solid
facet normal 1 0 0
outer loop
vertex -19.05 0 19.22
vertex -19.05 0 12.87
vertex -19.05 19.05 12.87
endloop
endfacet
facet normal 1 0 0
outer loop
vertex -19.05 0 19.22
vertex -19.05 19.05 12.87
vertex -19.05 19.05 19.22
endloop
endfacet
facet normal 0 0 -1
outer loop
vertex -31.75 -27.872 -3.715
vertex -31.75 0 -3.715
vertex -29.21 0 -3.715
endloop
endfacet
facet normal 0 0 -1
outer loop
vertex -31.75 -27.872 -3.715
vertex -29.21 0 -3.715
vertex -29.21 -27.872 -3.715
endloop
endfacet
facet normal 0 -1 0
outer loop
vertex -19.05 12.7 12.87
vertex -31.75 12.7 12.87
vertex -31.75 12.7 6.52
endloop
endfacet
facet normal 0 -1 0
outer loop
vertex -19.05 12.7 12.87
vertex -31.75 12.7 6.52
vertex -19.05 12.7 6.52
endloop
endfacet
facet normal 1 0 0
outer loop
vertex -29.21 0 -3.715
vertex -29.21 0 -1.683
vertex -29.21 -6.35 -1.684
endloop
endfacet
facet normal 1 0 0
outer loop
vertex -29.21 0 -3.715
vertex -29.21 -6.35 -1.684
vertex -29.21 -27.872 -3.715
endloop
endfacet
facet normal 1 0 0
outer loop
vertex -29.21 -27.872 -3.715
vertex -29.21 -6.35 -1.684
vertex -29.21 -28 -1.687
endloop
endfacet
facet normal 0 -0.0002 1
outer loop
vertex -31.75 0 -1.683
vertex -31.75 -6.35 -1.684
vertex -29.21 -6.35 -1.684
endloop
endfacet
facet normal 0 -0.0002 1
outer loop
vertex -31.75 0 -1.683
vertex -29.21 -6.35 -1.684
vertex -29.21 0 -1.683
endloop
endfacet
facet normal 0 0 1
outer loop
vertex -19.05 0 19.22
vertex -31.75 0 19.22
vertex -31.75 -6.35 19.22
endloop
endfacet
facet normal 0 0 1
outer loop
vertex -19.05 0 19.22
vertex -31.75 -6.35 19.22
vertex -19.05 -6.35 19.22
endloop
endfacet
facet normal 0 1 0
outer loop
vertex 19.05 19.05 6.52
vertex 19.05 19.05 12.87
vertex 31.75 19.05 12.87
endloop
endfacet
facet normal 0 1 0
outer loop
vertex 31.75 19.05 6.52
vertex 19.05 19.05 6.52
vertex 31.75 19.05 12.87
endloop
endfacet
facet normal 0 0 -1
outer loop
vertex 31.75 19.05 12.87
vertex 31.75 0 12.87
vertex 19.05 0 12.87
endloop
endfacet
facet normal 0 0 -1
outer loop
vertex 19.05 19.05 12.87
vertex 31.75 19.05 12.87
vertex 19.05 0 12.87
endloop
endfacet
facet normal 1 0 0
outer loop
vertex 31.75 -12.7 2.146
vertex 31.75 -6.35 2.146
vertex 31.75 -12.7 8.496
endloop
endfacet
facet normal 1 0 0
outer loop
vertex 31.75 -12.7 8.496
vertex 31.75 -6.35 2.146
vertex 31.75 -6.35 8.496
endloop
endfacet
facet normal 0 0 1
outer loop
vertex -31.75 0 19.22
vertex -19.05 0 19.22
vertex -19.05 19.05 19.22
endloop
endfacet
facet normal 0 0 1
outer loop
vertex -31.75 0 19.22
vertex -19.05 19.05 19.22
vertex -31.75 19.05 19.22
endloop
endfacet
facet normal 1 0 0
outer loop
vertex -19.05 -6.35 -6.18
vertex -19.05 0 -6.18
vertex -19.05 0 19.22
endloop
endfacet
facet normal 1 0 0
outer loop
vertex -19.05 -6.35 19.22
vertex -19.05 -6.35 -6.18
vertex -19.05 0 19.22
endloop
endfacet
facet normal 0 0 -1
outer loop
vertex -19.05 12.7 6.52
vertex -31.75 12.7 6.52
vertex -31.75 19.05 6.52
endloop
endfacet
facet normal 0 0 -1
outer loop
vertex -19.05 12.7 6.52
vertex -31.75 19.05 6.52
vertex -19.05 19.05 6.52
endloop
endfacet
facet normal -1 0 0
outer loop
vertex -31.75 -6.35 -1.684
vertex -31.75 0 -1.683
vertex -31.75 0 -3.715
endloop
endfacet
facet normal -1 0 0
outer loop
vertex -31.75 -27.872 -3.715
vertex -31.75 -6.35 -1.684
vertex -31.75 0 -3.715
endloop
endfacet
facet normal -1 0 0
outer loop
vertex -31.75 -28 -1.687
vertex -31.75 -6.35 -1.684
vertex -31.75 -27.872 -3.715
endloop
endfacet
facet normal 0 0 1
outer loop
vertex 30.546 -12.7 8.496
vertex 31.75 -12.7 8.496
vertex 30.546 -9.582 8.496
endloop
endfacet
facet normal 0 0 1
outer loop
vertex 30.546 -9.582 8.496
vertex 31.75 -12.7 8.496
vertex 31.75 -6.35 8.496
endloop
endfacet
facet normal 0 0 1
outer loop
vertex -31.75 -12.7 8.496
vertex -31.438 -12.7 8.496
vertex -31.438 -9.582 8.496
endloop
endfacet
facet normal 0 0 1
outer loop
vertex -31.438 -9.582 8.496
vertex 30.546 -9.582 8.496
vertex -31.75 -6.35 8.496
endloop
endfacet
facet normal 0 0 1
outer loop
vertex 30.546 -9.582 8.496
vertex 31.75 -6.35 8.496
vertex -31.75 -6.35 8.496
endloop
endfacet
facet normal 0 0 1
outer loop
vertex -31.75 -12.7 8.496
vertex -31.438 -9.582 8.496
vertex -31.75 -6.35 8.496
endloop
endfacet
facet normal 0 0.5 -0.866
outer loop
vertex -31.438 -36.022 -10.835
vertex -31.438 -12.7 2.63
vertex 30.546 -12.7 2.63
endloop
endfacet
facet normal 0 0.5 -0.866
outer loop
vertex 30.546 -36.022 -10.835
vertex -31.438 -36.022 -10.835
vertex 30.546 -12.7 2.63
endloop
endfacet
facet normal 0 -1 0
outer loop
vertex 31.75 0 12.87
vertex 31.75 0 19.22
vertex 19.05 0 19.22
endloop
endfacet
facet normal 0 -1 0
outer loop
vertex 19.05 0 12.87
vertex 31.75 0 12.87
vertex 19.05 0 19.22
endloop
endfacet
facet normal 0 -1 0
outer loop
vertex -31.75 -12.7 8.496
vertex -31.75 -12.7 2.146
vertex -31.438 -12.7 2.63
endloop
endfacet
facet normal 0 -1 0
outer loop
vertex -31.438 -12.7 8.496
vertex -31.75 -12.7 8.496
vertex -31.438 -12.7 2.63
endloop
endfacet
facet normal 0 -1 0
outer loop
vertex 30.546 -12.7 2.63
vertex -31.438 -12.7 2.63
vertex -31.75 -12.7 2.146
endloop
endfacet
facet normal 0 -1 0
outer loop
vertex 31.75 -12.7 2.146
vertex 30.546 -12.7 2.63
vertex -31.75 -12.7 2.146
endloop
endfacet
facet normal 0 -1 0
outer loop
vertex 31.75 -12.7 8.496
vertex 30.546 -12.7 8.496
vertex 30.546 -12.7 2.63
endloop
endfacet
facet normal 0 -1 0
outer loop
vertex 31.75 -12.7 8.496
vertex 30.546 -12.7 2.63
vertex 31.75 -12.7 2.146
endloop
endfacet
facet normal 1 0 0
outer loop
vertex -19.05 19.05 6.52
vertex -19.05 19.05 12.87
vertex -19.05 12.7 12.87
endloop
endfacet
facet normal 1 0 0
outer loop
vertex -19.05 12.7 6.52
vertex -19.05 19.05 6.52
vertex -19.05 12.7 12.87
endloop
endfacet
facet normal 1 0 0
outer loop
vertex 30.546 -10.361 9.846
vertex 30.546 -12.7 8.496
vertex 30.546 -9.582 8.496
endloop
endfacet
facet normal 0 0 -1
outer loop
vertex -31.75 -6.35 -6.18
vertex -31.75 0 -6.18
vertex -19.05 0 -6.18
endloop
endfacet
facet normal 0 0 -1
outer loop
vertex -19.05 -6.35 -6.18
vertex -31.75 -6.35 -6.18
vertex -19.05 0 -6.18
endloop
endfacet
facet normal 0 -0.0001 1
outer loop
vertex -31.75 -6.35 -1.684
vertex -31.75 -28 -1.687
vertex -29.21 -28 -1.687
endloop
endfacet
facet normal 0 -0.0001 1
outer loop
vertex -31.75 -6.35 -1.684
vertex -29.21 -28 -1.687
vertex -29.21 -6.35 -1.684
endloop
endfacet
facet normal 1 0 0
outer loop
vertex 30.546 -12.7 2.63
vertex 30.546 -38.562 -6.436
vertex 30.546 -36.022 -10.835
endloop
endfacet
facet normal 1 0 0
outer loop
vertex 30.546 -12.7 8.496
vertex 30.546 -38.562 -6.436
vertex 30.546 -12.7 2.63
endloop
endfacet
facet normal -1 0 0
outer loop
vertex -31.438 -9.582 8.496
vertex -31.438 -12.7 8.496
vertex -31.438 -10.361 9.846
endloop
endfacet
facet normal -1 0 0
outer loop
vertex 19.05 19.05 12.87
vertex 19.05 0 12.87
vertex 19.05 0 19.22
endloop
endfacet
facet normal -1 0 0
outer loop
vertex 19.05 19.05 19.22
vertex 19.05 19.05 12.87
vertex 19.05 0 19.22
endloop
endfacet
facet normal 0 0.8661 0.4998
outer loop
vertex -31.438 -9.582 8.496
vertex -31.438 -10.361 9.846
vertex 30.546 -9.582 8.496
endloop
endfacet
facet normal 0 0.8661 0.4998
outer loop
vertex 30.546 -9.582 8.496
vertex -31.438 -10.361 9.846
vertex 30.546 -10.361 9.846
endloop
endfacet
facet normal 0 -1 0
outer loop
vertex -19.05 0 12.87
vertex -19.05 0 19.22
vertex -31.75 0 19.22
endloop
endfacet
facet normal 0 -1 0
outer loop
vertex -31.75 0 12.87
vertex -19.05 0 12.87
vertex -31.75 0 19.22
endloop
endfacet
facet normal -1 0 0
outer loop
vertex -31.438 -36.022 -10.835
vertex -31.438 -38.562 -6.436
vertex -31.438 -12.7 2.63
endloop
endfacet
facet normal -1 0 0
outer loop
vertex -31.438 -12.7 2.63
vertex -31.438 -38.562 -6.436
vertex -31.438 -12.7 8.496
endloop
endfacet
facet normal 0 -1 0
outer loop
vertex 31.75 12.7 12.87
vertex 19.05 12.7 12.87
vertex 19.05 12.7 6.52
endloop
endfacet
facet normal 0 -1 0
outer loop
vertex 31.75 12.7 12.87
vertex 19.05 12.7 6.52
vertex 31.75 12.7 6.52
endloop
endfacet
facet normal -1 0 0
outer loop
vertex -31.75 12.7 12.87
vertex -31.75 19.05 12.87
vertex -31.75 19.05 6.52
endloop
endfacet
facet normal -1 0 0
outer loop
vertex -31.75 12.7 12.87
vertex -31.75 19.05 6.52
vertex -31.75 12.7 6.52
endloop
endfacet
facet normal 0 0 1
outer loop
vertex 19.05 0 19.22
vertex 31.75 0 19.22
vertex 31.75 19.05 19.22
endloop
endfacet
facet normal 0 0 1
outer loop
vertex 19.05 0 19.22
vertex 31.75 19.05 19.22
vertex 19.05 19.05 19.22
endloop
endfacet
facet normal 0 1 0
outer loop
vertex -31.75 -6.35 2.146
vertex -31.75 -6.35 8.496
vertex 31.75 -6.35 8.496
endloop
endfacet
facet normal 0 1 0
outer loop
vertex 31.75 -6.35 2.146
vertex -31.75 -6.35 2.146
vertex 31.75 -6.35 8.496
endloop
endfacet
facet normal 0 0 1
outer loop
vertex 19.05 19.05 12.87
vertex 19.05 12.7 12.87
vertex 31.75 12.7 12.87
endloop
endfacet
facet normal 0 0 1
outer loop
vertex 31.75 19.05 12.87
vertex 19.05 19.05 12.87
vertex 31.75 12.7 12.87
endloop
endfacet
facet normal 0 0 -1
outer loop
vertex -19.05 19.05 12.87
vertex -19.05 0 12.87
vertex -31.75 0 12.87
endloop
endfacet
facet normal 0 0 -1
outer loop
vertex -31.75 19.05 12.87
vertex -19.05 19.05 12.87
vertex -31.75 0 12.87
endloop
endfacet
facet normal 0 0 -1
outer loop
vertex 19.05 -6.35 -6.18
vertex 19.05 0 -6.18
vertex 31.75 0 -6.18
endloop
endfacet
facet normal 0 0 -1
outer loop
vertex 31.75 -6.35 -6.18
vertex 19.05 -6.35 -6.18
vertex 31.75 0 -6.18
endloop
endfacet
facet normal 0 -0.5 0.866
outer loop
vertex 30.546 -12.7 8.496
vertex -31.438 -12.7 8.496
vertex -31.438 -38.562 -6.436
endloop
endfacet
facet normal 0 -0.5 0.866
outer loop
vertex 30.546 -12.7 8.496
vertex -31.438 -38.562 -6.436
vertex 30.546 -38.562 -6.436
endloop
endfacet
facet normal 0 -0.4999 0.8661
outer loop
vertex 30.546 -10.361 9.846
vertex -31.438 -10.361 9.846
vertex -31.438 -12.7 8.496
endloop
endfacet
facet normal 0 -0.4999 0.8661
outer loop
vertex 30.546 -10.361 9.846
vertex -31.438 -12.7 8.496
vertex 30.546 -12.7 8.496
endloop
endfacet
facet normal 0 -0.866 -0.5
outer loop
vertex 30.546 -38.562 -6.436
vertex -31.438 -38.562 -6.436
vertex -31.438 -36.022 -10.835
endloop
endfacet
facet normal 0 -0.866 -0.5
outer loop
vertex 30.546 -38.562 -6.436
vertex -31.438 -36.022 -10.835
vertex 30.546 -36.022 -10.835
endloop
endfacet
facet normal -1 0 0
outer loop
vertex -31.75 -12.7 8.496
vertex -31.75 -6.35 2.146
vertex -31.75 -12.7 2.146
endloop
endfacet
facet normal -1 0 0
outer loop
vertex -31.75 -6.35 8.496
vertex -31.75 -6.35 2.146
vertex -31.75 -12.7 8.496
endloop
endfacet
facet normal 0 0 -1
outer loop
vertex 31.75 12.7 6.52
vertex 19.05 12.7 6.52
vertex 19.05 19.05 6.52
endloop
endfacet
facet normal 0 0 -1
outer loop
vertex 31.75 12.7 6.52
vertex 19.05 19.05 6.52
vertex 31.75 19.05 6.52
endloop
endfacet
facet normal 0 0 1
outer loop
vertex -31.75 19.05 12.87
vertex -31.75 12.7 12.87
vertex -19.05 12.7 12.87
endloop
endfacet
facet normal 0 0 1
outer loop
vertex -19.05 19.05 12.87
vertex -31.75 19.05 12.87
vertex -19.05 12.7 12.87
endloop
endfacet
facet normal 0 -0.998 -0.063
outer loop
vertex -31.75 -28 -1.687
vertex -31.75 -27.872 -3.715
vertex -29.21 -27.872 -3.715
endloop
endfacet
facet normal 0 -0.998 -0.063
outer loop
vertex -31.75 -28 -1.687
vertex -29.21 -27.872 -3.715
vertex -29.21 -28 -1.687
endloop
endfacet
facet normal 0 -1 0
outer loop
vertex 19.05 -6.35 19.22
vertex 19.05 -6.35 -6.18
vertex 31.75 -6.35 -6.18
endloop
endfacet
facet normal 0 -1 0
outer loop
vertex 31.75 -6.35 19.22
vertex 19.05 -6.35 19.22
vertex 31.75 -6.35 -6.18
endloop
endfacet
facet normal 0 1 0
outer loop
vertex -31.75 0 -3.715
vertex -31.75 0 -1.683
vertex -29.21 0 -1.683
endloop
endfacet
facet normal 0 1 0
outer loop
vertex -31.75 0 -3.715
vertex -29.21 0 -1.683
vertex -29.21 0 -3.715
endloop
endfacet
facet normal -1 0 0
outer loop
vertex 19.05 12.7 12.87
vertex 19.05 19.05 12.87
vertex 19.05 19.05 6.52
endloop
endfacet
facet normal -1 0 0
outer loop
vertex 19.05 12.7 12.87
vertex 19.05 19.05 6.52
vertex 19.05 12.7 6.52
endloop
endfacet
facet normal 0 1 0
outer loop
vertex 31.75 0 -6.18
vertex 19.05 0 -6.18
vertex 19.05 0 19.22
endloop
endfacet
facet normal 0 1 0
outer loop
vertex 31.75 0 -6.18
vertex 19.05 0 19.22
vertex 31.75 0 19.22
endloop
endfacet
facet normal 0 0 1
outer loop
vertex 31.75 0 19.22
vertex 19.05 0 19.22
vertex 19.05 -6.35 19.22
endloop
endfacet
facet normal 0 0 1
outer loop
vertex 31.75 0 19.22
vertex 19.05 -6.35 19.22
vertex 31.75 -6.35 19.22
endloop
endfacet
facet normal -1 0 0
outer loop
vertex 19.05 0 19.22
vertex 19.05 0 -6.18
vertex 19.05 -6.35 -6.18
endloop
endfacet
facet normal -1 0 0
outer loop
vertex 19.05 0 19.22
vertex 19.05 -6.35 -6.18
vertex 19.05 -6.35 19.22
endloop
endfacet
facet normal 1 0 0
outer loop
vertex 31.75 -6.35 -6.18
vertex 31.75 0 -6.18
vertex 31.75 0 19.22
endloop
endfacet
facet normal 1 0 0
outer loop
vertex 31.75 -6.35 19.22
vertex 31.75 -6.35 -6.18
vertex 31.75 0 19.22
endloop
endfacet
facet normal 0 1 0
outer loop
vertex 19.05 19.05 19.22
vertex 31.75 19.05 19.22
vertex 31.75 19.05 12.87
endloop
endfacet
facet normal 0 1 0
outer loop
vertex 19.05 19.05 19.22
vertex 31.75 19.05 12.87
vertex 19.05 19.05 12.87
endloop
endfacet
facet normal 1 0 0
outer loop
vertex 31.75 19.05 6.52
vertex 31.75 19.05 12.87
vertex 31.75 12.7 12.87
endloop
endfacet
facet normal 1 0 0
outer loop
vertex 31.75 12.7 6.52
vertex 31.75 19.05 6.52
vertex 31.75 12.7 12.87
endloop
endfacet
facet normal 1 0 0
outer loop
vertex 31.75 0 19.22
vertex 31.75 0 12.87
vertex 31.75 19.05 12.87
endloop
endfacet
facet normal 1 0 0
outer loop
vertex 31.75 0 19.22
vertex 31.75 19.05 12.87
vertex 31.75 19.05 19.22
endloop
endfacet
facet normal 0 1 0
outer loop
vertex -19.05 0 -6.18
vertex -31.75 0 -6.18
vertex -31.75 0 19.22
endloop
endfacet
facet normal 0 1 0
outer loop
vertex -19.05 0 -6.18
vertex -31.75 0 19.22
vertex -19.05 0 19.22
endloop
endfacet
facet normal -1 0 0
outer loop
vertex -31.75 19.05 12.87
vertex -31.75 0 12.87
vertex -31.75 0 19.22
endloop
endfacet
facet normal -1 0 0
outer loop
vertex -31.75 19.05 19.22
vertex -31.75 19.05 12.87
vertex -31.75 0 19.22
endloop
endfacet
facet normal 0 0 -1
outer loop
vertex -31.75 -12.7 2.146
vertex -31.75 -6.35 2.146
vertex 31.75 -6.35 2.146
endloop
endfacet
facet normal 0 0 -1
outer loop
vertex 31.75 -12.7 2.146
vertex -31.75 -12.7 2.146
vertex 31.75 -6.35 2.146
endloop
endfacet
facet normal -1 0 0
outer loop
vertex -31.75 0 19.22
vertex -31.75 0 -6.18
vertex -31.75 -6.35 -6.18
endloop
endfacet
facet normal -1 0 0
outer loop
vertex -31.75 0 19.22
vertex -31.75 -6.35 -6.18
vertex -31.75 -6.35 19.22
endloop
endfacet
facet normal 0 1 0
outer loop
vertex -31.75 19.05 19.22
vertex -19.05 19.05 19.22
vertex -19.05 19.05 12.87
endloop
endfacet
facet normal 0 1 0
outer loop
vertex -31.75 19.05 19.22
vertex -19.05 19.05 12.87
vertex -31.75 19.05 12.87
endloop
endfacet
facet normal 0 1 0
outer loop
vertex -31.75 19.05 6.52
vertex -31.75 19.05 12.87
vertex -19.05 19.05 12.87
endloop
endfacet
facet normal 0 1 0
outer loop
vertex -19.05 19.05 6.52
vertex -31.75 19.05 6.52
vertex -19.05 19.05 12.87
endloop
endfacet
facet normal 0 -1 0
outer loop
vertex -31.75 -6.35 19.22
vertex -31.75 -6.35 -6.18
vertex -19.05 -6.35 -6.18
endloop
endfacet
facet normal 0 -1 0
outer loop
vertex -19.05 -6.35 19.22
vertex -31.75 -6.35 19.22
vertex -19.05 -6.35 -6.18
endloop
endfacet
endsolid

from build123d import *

# Parameters (mm, degrees)
F0_W      = 12.7
F0_H      = 25.4
F1_DEPTH  = 6.35
F2_W      = 12.7
F2_H      = 6.35
F4_DEPTH  = 19.05
F3_W      = 12.7
F3_H      = 6.35
F5_W      = 12.7
F5_H      = 6.35
F7_DEPTH  = 6.35
F6_W      = 12.7
F6_H      = 6.35
F8_W      = 50.8
F8_H      = 6.35
F8_W_2    = 12.7
F9_DEPTH  = 6.35
F11_W     = 61.9835611433
F11_H     = 32.5631750748
F12_DEPTH = 5.08
F14_DEPTH = 2.54
F15_R     = 0.635
F16_DEPTH = 2.54


with BuildPart() as f1:
    # F0 (on Front) → F1 (new body)
    with BuildSketch(Plane.XZ):
        with Locations((-25.4, 6.5199454318)):
            Rectangle(F0_W, F0_H)
    extrude(amount=F1_DEPTH)

    # F15 (on face) → F16 (cut)
    with BuildSketch(Plane(origin=(-31.75, 0, 0), x_dir=(0, -1, 0), z_dir=(-1, 0, 0))):
        with Locations((1.8122547523, -2.6470723096)):
            Circle(F15_R)
        with Locations((26.4526117745, -2.6470723096)):
            Circle(F15_R)
    extrude(amount=F16_DEPTH, mode=Mode.SUBTRACT)


with BuildPart() as f1b:
    # F0 (on Front) → F1, piece 2 (new body)
    with BuildSketch(Plane.XZ):
        with Locations((25.4, 6.5199454318)):
            Rectangle(F0_W, F0_H)
    extrude(amount=F1_DEPTH)


with BuildPart() as f4:
    # F2 (on face) → F4 (new body)
    with BuildSketch(Plane(origin=(0, 0, 0), x_dir=(-1, 0, 0), z_dir=(0, 1, 0))):
        with Locations((-25.4, 16.0449454318)):
            Rectangle(F2_W, F2_H)
    extrude(amount=F4_DEPTH)


with BuildPart() as f4b:
    # F3 (on face) → F4, piece 2 (new body)
    with BuildSketch(Plane(origin=(0, 0, 0), x_dir=(-1, 0, 0), z_dir=(0, 1, 0))):
        with Locations((25.4, 16.0449454318)):
            Rectangle(F3_W, F3_H)
    extrude(amount=F4_DEPTH)


with BuildPart() as f7:
    # F5 (on face) → F7 (new body)
    with BuildSketch(Plane(origin=(0, 0, 12.8699454318), x_dir=(1, 0, 0), z_dir=(0, 0, -1))):
        with Locations((25.4, -15.875)):
            Rectangle(F5_W, F5_H)
    extrude(amount=F7_DEPTH)


with BuildPart() as f7b:
    # F6 (on face) → F7, piece 2 (new body)
    with BuildSketch(Plane(origin=(0, 0, 12.8699454318), x_dir=(1, 0, 0), z_dir=(0, 0, -1))):
        with Locations((-25.4, -15.875)):
            Rectangle(F6_W, F6_H)
    extrude(amount=F7_DEPTH)


with BuildPart() as f9:
    # F8 (on face) → F9 (new body)
    with BuildSketch(Plane.XZ.offset(6.35)):
        with Locations((6.35, 5.3208485242)):
            Rectangle(F8_W, F8_H)
        with Locations((-25.4, 5.3208485242)):
            Rectangle(F8_W_2, F8_H)
    extrude(amount=F9_DEPTH)

    # F11 (on face) → F12 (join)
    with BuildSketch(Plane(origin=(0, -6.8538103243, 11.8711477072), x_dir=(1, 0, 0), z_dir=(0, -0.5, 0.8660254038))):
        with Locations((-0.445750542, -20.3317538835)):
            Rectangle(F11_W, F11_H)
    extrude(amount=-F12_DEPTH)


with BuildPart() as f14:
    # F13 (on face) → F14 (new body)
    with BuildSketch(Plane(origin=(-31.75, 0, 0), x_dir=(0, -1, 0), z_dir=(-1, 0, 0))):
        Polygon((27.9999282211, -1.6870471141), (6.35, -1.6839353901), (6.35, -3.7150227105), (27.8721041995, -3.7150227105), align=None)
        Polygon((6.35, -1.6839353901), (0, -1.6830227105), (0, -3.7150227105), (6.35, -3.7150227105), align=None)
    extrude(amount=-F14_DEPTH)


solid = Compound([f1.part, f1b.part, f4.part, f4b.part, f7.part, f7b.part, f9.part, f14.part])
